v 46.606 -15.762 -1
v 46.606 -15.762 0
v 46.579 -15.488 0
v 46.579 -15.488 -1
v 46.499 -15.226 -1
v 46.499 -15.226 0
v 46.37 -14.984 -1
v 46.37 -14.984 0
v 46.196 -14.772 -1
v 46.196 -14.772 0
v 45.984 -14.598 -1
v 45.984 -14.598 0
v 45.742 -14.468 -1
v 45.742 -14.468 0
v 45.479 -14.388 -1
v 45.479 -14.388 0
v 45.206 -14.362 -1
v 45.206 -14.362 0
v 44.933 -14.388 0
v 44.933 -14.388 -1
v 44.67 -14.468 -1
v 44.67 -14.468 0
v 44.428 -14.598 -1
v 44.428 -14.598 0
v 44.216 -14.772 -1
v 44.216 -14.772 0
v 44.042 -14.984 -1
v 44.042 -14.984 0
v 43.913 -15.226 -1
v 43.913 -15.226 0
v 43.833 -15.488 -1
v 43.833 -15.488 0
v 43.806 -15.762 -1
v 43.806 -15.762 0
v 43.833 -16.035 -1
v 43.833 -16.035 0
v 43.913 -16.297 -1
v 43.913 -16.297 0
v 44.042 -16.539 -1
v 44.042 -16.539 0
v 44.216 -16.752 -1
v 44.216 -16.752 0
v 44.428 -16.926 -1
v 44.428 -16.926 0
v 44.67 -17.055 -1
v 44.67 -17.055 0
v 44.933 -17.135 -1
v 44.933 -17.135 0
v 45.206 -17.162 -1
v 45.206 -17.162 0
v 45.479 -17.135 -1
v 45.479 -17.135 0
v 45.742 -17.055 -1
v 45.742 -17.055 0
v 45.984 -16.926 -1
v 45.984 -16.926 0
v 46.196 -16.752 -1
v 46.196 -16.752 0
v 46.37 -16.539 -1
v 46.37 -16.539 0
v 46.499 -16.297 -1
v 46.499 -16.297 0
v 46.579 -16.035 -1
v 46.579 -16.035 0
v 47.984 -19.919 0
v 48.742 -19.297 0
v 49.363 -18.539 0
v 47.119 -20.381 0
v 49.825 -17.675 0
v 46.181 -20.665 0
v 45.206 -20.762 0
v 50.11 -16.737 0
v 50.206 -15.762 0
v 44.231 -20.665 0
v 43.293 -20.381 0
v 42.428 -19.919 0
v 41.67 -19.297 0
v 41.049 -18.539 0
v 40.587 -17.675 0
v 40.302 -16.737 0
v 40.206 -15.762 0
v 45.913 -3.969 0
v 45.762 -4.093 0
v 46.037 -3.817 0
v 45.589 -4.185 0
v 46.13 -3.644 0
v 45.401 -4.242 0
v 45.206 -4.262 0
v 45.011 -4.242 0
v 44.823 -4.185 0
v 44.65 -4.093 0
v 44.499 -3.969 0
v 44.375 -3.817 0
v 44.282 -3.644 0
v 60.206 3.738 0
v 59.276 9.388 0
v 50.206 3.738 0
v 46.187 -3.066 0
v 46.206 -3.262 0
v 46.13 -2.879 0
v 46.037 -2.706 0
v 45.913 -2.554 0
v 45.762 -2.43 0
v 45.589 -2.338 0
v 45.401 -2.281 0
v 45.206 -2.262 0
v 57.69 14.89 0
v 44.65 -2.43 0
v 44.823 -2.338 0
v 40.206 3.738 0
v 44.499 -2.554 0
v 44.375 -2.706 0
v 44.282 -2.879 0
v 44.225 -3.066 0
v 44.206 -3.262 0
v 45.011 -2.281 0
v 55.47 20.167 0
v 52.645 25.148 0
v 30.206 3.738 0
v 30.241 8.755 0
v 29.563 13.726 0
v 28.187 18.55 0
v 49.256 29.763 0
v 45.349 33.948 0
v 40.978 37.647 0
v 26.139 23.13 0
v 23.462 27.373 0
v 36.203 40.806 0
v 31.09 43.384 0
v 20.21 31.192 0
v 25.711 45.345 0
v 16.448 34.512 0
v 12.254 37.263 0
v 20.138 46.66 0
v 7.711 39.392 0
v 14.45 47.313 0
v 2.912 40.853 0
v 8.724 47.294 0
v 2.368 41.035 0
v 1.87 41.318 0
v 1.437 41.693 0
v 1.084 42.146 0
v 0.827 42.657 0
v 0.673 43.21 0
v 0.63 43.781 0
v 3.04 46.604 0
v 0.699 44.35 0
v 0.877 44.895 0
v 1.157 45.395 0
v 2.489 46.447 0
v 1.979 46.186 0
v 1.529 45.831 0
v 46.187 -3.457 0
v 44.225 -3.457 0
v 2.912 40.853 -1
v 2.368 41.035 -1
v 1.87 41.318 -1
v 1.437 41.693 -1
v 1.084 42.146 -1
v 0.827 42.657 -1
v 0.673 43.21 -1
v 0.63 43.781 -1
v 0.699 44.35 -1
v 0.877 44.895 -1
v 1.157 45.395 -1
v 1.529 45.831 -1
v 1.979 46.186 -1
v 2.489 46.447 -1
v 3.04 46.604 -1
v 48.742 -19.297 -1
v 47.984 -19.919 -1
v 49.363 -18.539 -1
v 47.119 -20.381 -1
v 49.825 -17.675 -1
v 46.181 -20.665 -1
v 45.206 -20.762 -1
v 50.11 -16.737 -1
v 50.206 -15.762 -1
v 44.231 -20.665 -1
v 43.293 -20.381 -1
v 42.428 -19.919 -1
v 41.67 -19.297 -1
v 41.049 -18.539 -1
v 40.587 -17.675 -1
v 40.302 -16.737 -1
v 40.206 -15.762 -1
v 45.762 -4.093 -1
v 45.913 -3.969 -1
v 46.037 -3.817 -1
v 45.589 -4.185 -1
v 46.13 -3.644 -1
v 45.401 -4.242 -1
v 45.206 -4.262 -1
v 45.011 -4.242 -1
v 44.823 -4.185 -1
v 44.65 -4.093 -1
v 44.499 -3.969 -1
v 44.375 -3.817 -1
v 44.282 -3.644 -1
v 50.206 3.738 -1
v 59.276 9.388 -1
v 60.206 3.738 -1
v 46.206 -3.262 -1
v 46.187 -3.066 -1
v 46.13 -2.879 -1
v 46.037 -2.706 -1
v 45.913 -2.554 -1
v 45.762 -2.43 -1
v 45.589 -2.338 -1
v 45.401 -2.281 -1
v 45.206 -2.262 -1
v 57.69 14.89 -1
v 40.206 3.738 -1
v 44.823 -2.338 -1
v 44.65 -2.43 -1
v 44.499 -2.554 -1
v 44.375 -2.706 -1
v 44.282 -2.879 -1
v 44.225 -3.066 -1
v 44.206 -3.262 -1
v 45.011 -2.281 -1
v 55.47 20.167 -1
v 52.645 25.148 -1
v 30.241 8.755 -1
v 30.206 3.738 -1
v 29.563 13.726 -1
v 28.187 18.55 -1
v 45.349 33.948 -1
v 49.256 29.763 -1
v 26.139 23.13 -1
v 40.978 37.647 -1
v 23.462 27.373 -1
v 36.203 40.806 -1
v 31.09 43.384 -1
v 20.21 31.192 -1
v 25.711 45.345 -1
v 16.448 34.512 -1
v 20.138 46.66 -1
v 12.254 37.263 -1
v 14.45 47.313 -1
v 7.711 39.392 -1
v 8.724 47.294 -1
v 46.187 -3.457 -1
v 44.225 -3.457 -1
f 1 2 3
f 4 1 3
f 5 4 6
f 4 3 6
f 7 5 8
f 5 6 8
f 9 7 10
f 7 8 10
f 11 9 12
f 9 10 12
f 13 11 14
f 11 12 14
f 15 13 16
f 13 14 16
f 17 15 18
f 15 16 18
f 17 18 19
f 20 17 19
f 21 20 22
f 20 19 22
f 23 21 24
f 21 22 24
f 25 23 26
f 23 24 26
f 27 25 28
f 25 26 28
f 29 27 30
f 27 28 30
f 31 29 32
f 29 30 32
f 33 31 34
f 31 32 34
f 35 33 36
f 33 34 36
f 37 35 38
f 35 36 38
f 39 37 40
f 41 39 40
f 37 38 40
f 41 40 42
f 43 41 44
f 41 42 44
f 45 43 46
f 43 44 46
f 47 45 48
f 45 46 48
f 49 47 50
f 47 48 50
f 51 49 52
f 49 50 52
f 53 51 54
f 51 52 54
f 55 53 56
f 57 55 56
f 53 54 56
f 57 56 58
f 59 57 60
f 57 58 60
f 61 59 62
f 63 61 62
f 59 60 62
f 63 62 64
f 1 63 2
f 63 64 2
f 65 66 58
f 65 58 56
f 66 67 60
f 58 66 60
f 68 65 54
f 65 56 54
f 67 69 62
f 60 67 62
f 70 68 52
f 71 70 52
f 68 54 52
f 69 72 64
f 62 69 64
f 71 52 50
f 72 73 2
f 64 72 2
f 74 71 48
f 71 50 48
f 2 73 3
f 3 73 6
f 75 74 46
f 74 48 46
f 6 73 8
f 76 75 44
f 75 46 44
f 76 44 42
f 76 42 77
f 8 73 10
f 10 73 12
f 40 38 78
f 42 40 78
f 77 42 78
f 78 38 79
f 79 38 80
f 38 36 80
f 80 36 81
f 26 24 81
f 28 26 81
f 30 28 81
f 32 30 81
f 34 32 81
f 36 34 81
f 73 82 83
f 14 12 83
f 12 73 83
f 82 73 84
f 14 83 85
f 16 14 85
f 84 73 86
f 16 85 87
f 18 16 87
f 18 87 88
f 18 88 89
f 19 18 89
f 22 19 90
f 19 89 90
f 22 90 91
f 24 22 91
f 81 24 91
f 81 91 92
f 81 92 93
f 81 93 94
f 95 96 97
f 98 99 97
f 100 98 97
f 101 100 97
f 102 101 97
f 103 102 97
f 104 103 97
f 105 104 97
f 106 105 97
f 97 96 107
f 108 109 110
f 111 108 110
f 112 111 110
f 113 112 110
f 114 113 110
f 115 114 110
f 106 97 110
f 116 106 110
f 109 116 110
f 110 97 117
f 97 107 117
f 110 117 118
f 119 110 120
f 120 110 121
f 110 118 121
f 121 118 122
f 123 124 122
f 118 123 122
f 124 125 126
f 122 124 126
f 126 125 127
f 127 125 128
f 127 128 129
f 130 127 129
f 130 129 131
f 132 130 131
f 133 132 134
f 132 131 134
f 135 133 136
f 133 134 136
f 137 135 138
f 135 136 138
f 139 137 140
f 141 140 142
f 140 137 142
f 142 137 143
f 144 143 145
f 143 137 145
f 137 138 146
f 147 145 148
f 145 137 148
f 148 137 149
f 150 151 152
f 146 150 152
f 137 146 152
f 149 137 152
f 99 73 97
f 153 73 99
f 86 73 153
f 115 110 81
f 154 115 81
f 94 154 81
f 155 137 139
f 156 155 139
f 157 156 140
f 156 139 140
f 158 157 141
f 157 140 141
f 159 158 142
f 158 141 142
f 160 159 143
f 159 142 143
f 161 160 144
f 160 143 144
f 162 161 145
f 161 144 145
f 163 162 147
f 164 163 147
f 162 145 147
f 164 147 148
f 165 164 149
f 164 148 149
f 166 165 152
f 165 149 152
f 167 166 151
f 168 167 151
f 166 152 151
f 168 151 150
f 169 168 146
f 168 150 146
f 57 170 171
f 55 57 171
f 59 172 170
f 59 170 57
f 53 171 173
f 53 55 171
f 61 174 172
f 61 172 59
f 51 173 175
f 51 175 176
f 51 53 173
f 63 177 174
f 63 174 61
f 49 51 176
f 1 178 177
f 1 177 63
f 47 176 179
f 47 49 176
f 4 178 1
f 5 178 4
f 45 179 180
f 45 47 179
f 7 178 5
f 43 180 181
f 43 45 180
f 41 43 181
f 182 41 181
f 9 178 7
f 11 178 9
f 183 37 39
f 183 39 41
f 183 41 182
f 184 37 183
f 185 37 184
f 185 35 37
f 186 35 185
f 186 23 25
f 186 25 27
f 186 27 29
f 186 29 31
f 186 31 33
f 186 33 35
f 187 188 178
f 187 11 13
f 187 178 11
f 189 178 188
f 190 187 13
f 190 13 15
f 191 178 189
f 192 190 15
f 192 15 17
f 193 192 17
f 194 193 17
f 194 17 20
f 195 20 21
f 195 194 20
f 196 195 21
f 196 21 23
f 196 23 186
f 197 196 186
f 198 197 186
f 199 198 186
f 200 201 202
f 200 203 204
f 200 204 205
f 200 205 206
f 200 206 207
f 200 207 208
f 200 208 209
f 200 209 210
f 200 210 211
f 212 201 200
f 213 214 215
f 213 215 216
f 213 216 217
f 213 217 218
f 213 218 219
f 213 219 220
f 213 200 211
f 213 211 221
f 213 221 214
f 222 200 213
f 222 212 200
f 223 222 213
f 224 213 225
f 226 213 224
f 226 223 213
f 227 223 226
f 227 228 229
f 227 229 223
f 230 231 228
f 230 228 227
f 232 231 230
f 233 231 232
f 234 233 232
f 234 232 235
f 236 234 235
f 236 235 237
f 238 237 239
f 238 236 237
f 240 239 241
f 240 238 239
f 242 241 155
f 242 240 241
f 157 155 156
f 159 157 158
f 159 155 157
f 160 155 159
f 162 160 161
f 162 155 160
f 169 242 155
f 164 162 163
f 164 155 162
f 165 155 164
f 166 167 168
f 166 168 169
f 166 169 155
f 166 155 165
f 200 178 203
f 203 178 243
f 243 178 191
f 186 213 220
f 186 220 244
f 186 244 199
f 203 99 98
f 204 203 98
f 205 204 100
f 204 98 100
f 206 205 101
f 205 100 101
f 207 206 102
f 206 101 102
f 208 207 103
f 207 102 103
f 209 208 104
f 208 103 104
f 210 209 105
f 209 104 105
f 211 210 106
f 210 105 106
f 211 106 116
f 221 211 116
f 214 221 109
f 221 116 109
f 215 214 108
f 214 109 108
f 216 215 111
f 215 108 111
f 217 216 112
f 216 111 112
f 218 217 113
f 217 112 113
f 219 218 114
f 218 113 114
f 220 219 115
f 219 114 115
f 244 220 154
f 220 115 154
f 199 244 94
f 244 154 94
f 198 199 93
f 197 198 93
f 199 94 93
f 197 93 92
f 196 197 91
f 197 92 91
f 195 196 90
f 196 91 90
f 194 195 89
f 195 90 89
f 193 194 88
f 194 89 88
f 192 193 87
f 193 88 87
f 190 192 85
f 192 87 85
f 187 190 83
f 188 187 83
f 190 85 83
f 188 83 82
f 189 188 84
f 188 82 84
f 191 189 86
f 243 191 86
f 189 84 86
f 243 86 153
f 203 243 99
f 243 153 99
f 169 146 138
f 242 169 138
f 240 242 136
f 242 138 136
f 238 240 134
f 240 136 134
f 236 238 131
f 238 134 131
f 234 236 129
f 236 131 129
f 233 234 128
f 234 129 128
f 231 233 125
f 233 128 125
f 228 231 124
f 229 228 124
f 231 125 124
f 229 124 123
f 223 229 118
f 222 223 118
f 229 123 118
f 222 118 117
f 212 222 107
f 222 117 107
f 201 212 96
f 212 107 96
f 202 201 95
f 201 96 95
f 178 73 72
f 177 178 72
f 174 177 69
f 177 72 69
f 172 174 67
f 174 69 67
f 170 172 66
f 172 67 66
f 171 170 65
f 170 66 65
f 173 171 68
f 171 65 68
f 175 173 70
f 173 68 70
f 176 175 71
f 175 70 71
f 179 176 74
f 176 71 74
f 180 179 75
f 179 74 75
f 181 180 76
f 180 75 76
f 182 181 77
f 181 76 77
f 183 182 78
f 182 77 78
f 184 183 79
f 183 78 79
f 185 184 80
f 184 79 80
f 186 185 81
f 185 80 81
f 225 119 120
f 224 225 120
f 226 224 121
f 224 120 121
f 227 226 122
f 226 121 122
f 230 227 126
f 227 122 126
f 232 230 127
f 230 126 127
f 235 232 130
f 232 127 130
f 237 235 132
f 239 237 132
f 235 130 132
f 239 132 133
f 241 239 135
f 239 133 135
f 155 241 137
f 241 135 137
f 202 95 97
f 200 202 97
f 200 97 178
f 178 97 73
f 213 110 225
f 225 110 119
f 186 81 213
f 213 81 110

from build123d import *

# Parameters (mm, degrees)
MODEL_R           = 1.4
MODEL_R_2         = 1
BRIDA_BASE1_DEPTH = 1


# Sheet-metal steps are written as plain solids
with BuildPart() as part:
    # Model → Brida base1 (new body)
    with BuildSketch(Plane.XY):
        with BuildLine():
            Line((60.2059904, 3.7384384), (50.2059904, 3.7384384))
            Line((50.2059904, 3.7384384), (50.2059904, -15.7615616))
            ThreePointArc((50.2059904, -15.7615616), (45.2059904, -20.7615616), (40.2059904, -15.7615616))
            Line((40.2059904, -15.7615616), (40.2059904, 3.7384384))
            Line((40.2059904, 3.7384384), (30.2059904, 3.7384384))
            ThreePointArc((30.2059904, 3.7384384), (23.46215545, 27.372628124), (2.911625265, 40.853352987))
            ThreePointArc((2.911625265, 40.853352987), (0.630018379, 43.781083427), (3.040300155, 46.603826289))
            ThreePointArc((3.040300155, 46.603826289), (40.977818177, 37.646613371), (60.2059904, 3.7384384))
        make_face()
        with Locations((45.2059904, -15.7615616)):
            Circle(MODEL_R, mode=Mode.SUBTRACT)
        with Locations((45.2059904, -3.2615616)):
            Circle(MODEL_R_2, mode=Mode.SUBTRACT)
    extrude(amount=-BRIDA_BASE1_DEPTH)


solid = part.part
